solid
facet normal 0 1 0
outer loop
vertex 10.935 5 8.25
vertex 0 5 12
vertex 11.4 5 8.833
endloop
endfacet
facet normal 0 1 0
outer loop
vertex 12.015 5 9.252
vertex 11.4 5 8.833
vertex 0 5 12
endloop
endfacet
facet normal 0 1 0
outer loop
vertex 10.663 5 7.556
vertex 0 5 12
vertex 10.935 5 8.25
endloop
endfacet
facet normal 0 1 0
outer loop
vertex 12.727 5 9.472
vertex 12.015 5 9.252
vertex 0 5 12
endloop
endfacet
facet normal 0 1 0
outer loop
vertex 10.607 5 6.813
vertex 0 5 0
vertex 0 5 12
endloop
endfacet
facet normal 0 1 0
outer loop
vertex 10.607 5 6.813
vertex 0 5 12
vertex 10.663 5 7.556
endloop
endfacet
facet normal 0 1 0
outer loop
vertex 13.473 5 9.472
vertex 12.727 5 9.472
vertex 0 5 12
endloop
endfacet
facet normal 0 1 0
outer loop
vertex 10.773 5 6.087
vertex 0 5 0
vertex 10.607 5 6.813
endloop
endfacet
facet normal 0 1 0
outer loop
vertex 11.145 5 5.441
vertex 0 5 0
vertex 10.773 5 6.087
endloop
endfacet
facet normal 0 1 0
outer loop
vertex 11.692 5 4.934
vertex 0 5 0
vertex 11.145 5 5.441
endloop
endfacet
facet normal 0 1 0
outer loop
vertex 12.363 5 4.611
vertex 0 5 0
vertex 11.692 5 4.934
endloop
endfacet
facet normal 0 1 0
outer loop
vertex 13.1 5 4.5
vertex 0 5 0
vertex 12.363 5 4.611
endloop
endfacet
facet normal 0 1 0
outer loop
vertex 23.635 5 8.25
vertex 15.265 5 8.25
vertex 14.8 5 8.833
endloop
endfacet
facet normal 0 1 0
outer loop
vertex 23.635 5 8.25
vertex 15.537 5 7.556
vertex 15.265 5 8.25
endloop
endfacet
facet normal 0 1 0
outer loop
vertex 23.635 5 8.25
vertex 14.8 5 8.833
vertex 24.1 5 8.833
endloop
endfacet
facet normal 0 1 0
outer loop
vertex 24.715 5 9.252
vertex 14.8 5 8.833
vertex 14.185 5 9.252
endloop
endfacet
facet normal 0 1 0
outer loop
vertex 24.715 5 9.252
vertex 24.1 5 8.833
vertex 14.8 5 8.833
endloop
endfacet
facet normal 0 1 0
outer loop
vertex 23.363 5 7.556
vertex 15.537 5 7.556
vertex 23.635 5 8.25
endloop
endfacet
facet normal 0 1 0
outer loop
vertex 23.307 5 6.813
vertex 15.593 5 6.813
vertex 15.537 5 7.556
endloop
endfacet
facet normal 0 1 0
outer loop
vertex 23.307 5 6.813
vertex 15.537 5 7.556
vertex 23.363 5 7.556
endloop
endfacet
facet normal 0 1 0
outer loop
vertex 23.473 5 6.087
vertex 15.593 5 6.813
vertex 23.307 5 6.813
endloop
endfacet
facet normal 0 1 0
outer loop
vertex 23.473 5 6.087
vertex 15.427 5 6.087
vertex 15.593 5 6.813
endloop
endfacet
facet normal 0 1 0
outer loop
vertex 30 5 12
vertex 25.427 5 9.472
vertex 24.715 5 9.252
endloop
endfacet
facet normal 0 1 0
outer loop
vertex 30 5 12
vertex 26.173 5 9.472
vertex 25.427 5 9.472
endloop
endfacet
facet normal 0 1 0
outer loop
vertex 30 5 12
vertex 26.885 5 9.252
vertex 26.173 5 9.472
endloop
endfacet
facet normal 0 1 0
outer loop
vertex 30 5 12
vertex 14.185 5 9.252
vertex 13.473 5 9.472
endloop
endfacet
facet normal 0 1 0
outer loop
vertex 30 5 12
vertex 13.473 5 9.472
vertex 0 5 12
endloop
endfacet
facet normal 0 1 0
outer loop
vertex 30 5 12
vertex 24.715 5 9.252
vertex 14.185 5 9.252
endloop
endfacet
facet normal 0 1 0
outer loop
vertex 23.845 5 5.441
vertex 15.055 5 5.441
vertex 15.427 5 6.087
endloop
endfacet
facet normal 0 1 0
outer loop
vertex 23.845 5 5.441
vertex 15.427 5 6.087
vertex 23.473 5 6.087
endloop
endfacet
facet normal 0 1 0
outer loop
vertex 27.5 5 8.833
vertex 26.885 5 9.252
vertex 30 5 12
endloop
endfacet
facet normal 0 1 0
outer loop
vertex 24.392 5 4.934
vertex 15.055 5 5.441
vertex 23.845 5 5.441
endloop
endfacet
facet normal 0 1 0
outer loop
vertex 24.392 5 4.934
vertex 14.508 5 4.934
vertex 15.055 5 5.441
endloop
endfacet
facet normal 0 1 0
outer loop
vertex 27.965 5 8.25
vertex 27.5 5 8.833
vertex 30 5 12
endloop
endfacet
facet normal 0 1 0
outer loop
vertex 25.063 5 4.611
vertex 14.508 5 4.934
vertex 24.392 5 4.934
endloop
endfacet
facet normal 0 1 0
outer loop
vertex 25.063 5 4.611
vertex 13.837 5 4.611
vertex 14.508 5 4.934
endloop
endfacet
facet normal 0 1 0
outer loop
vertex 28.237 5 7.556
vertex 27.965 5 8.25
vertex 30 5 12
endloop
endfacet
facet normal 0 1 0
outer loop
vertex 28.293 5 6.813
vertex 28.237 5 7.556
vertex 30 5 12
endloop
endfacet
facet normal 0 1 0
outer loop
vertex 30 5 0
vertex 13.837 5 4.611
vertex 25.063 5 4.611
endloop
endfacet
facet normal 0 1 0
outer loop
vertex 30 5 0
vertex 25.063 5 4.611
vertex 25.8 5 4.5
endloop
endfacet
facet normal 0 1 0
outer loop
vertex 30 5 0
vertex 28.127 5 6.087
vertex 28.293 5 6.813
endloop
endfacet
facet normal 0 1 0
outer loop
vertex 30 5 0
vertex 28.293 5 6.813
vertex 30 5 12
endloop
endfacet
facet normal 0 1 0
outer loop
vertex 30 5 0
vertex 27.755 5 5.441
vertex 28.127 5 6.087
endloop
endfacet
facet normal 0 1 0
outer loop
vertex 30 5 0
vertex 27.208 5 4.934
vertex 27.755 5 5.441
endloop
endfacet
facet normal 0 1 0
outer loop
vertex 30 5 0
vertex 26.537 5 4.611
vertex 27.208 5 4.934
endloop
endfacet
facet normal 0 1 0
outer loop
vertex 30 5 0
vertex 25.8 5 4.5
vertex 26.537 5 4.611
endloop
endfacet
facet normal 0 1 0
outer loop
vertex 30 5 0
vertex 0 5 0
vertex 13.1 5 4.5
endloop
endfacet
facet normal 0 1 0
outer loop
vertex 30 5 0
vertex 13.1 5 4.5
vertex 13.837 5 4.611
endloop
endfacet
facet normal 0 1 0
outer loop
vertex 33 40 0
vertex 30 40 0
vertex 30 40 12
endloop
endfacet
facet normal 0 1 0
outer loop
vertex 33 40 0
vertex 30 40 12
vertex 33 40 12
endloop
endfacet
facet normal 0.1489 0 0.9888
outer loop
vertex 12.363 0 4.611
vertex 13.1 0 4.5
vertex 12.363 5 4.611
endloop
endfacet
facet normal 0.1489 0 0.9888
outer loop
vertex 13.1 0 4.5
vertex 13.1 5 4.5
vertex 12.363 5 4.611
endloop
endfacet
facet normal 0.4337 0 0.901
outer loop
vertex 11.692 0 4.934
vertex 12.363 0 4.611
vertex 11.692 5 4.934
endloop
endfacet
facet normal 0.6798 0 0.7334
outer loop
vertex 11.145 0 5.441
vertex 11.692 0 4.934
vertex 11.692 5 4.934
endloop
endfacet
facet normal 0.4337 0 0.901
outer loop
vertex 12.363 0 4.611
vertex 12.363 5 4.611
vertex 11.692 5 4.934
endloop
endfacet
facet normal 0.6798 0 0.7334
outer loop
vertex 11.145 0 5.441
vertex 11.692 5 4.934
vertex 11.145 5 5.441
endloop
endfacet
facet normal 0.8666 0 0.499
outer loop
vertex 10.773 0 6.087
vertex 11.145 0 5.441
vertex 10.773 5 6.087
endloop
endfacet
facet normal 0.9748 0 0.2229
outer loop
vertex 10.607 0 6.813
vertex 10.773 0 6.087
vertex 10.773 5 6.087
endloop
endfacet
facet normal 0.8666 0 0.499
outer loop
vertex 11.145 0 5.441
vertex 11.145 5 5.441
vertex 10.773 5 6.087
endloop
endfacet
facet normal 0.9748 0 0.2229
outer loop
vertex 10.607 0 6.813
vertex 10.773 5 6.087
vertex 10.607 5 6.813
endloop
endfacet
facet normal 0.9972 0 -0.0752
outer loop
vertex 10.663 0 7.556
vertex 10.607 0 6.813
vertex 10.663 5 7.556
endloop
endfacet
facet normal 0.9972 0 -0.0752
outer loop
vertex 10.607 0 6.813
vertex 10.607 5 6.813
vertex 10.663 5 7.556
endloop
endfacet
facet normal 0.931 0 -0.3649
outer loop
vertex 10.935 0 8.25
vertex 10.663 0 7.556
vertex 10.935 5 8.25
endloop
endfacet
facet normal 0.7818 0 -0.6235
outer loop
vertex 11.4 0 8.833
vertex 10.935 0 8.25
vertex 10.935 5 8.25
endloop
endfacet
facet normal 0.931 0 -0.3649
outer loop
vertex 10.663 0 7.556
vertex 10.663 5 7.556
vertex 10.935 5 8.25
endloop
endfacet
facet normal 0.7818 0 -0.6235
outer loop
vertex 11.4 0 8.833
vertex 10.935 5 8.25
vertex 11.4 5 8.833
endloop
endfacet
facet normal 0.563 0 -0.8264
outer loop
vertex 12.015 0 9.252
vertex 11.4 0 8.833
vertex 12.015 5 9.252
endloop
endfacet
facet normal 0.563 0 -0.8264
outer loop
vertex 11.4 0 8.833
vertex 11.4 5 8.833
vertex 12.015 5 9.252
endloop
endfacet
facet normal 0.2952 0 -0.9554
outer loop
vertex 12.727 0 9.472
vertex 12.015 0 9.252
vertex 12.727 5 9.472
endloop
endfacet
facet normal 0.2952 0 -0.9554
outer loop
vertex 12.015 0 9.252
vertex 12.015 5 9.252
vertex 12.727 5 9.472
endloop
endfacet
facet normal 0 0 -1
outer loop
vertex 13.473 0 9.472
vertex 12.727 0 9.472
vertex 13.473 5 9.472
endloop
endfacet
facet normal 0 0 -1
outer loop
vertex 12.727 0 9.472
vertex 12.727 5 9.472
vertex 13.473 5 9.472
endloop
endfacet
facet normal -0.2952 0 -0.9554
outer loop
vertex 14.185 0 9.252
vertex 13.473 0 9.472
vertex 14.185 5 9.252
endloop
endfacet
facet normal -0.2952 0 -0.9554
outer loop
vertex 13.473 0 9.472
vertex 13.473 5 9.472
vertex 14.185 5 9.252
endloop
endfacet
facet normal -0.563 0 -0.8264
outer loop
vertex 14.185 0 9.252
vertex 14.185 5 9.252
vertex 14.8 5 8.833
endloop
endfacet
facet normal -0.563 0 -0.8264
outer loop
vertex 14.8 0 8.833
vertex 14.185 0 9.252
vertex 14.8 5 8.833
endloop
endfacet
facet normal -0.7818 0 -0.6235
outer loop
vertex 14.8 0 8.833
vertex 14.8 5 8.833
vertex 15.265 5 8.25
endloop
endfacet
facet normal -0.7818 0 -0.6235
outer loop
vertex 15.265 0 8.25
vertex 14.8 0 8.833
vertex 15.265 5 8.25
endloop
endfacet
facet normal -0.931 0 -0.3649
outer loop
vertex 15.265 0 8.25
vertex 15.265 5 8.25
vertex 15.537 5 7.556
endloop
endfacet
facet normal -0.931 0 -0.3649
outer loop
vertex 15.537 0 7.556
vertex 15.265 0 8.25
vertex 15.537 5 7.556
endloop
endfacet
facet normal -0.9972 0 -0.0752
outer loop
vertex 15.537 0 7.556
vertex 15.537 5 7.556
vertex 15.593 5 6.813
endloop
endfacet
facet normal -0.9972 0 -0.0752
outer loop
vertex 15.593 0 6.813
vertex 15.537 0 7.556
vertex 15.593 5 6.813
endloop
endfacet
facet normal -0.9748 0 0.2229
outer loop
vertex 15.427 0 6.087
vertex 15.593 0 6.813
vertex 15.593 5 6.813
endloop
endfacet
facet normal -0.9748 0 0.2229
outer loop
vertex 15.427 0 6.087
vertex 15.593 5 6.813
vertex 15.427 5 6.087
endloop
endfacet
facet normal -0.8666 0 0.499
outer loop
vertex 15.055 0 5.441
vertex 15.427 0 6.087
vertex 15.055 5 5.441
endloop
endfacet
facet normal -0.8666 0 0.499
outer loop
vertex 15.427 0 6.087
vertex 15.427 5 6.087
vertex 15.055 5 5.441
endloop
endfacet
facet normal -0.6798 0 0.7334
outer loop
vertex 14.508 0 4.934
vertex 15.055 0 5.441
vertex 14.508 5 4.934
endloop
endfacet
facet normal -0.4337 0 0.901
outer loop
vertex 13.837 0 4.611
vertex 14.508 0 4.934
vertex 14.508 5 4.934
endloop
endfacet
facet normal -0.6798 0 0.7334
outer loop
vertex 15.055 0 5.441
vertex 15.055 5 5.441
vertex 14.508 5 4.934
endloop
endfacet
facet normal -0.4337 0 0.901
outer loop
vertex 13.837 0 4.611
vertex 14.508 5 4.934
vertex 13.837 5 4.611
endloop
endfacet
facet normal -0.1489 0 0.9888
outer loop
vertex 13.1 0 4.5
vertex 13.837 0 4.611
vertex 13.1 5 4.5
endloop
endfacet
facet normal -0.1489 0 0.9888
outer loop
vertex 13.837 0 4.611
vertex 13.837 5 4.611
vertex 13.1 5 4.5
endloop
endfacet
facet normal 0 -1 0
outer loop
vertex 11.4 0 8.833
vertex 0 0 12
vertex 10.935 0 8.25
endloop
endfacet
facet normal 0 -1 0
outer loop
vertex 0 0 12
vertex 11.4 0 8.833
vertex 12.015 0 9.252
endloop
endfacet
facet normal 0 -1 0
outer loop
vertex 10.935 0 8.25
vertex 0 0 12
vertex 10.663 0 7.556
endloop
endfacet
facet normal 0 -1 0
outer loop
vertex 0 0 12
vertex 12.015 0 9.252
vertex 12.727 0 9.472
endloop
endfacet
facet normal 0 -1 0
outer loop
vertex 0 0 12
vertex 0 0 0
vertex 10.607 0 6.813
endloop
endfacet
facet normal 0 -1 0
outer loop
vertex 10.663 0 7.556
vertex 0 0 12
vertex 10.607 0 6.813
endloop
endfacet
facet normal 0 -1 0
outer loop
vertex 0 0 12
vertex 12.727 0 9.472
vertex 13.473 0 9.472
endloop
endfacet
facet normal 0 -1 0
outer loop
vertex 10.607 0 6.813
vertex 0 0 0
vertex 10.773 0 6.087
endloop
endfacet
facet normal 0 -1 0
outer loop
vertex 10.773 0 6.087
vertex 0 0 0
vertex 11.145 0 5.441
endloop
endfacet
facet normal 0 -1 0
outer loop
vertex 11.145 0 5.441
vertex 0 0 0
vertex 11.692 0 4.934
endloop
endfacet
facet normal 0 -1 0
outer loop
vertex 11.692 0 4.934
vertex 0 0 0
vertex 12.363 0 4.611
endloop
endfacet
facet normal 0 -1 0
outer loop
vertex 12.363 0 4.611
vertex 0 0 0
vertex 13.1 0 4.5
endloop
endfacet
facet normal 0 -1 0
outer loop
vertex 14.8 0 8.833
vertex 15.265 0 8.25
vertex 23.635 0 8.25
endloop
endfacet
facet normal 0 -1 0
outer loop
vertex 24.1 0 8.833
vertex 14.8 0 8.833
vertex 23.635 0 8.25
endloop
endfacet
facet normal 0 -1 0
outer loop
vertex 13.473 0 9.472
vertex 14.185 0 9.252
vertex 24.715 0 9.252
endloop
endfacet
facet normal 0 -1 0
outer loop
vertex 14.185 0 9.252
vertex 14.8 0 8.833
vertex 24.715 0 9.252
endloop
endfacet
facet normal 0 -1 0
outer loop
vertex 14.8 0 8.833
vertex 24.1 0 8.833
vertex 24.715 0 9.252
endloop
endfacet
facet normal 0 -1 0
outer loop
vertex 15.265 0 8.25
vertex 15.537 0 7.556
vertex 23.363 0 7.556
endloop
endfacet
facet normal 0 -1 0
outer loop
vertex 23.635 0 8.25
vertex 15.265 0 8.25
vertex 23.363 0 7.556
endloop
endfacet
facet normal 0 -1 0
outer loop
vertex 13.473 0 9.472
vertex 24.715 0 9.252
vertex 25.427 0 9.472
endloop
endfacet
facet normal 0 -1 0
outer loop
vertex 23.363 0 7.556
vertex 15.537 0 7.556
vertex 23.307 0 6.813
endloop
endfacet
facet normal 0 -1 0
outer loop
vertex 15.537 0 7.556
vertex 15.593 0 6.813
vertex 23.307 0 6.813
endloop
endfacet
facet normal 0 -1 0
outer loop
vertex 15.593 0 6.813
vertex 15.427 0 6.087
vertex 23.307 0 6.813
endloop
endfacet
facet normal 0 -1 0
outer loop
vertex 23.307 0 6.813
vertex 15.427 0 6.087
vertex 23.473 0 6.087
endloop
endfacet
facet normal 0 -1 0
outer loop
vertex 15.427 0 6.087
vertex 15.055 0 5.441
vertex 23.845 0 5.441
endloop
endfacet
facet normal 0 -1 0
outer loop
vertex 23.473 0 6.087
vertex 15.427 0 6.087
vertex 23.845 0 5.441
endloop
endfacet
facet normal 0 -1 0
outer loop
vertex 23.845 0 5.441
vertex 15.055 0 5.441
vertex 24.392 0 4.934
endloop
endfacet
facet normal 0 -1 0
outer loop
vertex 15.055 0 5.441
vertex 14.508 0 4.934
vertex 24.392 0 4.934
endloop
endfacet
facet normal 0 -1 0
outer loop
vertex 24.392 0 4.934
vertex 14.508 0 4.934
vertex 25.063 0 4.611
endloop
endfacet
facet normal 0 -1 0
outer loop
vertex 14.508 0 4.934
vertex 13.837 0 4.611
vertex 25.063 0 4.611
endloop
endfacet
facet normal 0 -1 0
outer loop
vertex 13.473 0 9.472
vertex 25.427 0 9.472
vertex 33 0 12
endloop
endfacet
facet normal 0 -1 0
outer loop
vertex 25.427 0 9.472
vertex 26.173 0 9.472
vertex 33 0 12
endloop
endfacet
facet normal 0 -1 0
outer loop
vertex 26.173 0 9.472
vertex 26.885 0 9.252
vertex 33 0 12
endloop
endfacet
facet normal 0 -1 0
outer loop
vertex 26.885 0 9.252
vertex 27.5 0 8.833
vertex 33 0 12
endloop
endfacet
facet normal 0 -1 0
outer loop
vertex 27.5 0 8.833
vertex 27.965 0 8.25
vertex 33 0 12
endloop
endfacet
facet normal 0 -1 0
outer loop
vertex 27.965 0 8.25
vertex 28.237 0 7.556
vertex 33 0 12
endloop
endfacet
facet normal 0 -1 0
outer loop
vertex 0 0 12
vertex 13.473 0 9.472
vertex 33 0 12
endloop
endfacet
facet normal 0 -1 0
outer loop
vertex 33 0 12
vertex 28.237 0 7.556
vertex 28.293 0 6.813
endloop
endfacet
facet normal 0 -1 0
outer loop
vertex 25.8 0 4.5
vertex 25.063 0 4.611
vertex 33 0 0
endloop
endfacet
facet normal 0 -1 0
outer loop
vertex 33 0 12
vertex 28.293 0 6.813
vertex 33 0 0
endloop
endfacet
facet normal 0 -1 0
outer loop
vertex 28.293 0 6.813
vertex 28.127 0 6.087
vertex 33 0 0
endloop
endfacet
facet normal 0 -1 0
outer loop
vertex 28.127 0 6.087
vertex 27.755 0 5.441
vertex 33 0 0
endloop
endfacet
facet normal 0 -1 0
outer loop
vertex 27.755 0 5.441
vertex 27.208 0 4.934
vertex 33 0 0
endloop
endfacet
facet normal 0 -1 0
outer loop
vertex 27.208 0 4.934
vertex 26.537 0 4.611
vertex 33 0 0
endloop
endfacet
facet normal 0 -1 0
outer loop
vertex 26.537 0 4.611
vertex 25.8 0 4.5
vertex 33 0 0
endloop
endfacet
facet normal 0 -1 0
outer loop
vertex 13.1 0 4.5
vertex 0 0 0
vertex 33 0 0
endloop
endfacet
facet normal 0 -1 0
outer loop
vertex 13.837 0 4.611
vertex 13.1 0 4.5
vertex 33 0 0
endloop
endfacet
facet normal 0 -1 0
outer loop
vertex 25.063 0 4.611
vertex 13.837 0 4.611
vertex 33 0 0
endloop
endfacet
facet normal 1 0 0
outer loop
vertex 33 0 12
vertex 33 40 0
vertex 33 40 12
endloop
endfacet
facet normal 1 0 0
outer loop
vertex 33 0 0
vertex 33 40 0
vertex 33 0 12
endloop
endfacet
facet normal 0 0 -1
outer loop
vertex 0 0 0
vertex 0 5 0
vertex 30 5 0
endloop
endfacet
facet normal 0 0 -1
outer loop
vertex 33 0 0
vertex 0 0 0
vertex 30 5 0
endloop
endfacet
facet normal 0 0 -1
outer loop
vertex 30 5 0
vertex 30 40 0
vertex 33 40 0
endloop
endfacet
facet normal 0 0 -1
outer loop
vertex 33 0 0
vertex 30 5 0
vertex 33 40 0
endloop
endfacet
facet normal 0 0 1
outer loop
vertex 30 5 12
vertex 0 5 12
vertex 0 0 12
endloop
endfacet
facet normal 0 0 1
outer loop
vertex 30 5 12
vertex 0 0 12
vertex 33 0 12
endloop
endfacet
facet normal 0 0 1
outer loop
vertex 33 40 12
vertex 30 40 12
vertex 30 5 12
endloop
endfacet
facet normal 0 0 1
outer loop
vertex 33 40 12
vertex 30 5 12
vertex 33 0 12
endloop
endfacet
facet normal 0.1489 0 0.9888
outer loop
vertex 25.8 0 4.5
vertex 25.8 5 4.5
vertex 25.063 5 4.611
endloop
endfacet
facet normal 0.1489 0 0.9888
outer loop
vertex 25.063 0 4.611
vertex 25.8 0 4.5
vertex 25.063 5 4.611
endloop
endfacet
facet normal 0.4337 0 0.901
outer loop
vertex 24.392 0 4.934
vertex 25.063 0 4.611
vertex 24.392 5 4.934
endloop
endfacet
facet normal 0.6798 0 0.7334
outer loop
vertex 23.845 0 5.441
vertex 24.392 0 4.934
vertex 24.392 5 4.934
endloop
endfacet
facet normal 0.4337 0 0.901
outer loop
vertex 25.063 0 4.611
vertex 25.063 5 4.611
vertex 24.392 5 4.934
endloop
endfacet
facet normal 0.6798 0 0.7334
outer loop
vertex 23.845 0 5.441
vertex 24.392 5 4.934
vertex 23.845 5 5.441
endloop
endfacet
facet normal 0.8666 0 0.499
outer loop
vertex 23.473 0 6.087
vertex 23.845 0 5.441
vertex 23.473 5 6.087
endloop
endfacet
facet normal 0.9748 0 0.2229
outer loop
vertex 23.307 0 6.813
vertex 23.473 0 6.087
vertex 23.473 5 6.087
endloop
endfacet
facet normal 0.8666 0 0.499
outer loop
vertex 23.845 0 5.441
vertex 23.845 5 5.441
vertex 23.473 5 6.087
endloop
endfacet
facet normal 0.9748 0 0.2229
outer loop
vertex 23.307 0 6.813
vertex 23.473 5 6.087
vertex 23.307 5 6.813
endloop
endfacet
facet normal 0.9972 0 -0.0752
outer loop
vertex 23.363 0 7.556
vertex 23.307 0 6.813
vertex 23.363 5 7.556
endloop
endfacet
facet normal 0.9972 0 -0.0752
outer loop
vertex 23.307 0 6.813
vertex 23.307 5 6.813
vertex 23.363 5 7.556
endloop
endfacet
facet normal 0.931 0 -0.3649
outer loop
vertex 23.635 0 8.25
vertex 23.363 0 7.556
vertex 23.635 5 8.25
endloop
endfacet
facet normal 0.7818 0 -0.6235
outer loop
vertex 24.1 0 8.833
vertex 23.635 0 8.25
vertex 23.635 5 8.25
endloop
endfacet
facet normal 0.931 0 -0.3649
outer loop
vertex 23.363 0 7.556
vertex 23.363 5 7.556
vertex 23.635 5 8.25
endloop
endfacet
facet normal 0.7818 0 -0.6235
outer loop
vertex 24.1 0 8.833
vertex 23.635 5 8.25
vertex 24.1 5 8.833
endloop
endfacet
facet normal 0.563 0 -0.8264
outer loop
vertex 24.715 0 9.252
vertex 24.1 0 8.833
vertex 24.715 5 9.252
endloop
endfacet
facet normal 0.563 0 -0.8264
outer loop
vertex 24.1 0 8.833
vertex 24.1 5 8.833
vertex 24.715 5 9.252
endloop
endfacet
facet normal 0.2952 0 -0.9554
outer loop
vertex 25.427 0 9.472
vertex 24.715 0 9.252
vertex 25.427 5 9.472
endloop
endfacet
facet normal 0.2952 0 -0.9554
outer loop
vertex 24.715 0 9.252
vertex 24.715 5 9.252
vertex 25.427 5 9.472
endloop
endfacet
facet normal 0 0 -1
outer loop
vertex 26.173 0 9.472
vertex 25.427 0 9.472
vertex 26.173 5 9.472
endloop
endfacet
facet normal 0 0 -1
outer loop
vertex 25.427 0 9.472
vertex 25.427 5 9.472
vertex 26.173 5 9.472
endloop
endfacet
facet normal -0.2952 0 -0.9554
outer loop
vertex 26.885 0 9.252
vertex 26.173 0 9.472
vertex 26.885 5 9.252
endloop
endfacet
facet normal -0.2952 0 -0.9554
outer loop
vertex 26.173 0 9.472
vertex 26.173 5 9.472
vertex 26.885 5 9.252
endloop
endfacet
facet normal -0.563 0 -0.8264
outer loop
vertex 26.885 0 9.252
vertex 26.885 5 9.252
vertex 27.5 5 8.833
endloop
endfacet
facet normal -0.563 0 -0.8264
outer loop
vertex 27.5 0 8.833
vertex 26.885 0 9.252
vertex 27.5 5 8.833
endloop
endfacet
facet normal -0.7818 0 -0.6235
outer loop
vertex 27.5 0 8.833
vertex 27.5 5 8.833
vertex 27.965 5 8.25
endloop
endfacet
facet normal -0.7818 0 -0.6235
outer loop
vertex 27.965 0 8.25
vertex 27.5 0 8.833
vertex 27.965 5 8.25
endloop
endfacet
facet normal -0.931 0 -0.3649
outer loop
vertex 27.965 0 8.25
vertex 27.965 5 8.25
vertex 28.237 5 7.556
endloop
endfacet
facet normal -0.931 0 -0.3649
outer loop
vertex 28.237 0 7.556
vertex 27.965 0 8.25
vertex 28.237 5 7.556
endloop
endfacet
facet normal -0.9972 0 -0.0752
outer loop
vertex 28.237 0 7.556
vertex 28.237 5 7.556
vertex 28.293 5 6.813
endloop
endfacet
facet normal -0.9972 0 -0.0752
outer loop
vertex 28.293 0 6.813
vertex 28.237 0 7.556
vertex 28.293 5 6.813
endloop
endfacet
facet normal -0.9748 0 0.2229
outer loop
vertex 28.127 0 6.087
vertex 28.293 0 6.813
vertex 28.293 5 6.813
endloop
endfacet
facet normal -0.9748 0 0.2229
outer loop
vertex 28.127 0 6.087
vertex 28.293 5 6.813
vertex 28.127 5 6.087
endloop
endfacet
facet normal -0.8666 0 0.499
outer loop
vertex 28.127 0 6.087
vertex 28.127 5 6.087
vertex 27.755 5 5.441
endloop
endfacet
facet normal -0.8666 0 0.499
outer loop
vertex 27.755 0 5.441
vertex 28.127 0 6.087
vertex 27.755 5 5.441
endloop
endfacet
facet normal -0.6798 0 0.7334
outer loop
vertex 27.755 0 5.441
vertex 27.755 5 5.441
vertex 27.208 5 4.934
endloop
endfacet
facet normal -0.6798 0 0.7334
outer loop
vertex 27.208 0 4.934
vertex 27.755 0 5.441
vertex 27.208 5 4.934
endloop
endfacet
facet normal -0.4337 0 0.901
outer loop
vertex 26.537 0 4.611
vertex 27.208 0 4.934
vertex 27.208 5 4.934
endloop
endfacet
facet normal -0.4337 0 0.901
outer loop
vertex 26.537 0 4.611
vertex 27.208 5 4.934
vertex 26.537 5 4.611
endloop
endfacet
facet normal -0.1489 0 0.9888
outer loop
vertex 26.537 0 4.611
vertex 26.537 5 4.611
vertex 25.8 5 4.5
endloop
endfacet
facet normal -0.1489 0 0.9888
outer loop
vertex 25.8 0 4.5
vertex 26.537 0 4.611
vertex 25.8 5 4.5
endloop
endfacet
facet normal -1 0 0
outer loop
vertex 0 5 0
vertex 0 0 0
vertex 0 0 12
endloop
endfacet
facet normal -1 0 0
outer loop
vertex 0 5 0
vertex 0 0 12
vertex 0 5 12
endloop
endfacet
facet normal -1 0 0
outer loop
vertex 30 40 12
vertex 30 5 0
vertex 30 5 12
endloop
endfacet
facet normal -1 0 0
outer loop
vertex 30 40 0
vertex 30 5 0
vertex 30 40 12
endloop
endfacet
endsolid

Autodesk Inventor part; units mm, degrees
ref_plane "YZ Plane" through (0, 0, 0) normal (1, 0, 0) x (0, 1, 0)
ref_plane "XZ Plane" through (0, 0, 0) normal (0, 1, 0) x (-1, 0, 0)
ref_plane "XY Plane" through (0, 0, 0) normal (0, 0, 1) x (1, 0, 0)
sketch "Sketch1" plane through (0, 0, 0) normal (0, 0, 1) x (1, 0, 0)
  line L0 (0, 0) -> (30, 0)
  line L1 (0, 0) -> (0, 5)
  line L2 (0, 5) -> (30, 5)
  line L3 (30, 5) -> (30, 0)
  line L4 (30, 5) -> (30, 40)
  line L5 (30, 40) -> (33, 40)
  line L6 (33, 40) -> (33, 0)
  line L7 (33, 0) -> (30, 0)
  point P0 (23.0555, 5)
  dimension "d0" = 30
  dimension "d2" = 5
  dimension "d11" = 35
  dimension "d12" = 3
extrude "Extrusion1" add sketch "Sketch1" along normal blind 12
sketch "Sketch2" plane through (0, 0, 0) normal (0, -1, 0) x (1, 0, 0)
  circle A0 centre (25.8, 7) radius 2.125
  line L0 (33, 0) -> (33, 12) projected
  line L1 (0, 12) -> (33, 12) projected
  circle A1 centre (13.1, 7) radius 2.125
  point P0 (0, 0)
  point P1 (33, 6)
  dimension "d13" = 4.25
  dimension "d14" = 7.2
  dimension "d15" = 5
  dimension "d23" = 4.25
  dimension "d24" = 19.9
  dimension "d25" = 5
hole "Hole1" at (25.8, 0, 7) at (13.1, 0, 7) direction (0, 1, 0) diameter 5 end through all
properties part number "Support"
